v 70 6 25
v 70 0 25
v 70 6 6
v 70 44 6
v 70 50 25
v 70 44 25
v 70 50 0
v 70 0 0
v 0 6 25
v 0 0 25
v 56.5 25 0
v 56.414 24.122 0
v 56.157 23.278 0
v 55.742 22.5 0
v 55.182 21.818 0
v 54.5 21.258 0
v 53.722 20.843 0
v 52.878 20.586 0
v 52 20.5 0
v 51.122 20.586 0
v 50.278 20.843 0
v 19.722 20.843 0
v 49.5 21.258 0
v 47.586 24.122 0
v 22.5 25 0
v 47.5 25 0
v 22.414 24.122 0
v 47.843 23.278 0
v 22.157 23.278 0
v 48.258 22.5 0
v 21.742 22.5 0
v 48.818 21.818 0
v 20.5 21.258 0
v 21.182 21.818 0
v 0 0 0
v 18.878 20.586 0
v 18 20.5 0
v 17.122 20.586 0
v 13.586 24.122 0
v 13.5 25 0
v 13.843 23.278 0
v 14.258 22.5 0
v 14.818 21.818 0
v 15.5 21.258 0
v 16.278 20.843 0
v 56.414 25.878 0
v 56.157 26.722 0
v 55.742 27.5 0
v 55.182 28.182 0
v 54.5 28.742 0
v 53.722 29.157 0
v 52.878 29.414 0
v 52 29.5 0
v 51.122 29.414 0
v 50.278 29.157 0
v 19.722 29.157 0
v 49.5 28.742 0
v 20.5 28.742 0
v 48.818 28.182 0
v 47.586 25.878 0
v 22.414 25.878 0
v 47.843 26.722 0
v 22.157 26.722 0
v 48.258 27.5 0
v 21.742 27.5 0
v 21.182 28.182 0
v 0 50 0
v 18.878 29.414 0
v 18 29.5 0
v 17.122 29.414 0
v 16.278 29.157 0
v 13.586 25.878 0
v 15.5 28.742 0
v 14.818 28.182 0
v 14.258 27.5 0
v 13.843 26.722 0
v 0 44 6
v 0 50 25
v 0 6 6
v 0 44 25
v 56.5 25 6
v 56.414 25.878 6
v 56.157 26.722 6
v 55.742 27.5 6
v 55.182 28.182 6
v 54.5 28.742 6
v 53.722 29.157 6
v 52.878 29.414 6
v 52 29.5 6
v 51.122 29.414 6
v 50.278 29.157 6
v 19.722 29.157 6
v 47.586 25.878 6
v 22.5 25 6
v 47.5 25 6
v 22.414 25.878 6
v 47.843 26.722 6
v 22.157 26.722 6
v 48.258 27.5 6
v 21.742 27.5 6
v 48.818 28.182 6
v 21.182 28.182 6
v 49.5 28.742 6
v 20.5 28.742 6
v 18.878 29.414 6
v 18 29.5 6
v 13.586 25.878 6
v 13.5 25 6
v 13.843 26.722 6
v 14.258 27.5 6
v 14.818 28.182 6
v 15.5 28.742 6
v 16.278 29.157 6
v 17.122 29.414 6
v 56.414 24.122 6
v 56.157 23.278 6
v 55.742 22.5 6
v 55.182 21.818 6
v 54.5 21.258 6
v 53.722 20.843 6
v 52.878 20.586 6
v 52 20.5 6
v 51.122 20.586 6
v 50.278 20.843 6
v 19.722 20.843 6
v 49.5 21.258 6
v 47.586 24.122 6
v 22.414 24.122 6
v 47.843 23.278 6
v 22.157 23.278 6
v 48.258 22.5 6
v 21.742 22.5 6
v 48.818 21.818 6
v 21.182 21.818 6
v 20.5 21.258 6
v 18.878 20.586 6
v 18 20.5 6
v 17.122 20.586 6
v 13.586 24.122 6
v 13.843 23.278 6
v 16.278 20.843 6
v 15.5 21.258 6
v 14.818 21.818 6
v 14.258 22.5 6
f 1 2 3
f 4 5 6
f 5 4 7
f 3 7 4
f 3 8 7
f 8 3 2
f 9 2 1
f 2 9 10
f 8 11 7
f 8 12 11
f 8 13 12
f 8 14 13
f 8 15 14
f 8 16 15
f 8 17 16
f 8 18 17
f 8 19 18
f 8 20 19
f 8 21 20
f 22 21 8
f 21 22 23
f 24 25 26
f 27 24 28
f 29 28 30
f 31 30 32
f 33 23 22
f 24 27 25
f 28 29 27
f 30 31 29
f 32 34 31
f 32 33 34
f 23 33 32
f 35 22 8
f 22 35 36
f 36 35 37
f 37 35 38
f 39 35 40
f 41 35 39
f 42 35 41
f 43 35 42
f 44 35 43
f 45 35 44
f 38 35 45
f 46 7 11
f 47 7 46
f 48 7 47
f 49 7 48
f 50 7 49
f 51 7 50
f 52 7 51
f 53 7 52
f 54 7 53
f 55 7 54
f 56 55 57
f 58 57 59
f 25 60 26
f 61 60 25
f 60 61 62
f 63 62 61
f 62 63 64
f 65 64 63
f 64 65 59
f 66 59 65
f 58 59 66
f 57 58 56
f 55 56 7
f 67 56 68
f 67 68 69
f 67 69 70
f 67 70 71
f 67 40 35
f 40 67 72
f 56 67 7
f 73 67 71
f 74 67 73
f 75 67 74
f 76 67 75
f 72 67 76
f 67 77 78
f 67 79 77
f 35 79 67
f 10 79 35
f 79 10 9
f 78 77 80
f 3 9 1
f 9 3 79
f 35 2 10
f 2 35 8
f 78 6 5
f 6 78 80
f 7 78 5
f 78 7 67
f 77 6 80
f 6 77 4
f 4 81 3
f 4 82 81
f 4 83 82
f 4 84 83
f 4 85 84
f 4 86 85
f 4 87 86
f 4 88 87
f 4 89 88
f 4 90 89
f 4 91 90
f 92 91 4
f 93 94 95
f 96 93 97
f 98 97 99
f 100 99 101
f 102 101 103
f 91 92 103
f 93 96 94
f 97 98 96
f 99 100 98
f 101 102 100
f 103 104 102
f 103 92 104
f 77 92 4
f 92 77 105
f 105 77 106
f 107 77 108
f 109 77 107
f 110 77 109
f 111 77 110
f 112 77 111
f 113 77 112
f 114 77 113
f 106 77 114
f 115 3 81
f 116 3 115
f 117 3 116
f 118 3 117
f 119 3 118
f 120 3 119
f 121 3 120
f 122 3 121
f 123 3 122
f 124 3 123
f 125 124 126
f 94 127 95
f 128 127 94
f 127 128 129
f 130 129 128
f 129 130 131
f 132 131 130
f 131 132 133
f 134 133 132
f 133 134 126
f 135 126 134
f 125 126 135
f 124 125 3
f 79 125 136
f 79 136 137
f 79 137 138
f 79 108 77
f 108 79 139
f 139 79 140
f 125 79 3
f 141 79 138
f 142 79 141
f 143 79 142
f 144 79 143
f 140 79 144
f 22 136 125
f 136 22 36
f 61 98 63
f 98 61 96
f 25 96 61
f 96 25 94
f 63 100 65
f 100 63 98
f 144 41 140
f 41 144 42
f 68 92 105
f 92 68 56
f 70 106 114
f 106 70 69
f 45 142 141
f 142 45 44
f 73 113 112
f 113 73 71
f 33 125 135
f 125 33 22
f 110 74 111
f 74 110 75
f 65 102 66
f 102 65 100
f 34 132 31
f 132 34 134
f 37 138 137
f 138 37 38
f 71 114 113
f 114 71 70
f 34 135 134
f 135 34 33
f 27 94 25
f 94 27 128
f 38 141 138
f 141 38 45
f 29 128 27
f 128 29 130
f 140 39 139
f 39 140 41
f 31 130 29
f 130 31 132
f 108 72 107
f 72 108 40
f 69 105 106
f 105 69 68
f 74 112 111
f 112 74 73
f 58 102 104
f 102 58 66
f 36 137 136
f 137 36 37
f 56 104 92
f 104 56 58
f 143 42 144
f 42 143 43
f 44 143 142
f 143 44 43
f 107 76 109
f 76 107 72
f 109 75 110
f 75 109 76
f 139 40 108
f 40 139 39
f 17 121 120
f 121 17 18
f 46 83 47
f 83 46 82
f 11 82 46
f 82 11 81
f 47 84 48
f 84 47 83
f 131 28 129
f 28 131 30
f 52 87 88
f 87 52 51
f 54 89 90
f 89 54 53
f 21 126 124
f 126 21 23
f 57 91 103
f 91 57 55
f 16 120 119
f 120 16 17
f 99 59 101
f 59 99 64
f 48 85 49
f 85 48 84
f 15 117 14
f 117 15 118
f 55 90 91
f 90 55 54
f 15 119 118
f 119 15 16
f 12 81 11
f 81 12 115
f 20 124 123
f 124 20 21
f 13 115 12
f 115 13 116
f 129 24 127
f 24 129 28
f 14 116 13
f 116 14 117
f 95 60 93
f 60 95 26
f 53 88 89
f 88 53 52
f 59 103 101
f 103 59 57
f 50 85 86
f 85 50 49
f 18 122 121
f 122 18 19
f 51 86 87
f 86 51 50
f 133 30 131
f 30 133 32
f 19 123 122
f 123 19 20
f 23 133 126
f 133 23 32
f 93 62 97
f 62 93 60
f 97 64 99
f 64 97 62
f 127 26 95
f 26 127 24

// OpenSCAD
$fn = 32;

// ----------------------------------------------------------------------
// U-bracket: 70 x 50 x 25 mm
// ----------------------------------------------------------------------

// --- parameters (mm) ---
length = 70;              // outer length, X
width = 50;               // outer width, Y
height = 25;              // upright height, Z
thick = 6;                // wall thickness
hole_d = 9;               // clearance for M8

module hole_z(px, py) {
  translate([px, py, -2.5]) cylinder(h = thick + 5, d = hole_d);
}
module hole_y_pz(pz) {
  /* through both uprights along Y */
  translate([0, -2.5, pz]) rotate([-90, 0, 0]) cylinder(h = width + 5, d = hole_d);
}

module base() {
  cube([length, width, thick]);
}

module uprights() {
  cube([length, thick, height]);
  translate([0, width - thick, 0]) cube([length, thick, height]);
}

difference() {
  union() {
    base();
    uprights();
  }
  hole_z(18, 25);
  hole_z(52, 25);
}
